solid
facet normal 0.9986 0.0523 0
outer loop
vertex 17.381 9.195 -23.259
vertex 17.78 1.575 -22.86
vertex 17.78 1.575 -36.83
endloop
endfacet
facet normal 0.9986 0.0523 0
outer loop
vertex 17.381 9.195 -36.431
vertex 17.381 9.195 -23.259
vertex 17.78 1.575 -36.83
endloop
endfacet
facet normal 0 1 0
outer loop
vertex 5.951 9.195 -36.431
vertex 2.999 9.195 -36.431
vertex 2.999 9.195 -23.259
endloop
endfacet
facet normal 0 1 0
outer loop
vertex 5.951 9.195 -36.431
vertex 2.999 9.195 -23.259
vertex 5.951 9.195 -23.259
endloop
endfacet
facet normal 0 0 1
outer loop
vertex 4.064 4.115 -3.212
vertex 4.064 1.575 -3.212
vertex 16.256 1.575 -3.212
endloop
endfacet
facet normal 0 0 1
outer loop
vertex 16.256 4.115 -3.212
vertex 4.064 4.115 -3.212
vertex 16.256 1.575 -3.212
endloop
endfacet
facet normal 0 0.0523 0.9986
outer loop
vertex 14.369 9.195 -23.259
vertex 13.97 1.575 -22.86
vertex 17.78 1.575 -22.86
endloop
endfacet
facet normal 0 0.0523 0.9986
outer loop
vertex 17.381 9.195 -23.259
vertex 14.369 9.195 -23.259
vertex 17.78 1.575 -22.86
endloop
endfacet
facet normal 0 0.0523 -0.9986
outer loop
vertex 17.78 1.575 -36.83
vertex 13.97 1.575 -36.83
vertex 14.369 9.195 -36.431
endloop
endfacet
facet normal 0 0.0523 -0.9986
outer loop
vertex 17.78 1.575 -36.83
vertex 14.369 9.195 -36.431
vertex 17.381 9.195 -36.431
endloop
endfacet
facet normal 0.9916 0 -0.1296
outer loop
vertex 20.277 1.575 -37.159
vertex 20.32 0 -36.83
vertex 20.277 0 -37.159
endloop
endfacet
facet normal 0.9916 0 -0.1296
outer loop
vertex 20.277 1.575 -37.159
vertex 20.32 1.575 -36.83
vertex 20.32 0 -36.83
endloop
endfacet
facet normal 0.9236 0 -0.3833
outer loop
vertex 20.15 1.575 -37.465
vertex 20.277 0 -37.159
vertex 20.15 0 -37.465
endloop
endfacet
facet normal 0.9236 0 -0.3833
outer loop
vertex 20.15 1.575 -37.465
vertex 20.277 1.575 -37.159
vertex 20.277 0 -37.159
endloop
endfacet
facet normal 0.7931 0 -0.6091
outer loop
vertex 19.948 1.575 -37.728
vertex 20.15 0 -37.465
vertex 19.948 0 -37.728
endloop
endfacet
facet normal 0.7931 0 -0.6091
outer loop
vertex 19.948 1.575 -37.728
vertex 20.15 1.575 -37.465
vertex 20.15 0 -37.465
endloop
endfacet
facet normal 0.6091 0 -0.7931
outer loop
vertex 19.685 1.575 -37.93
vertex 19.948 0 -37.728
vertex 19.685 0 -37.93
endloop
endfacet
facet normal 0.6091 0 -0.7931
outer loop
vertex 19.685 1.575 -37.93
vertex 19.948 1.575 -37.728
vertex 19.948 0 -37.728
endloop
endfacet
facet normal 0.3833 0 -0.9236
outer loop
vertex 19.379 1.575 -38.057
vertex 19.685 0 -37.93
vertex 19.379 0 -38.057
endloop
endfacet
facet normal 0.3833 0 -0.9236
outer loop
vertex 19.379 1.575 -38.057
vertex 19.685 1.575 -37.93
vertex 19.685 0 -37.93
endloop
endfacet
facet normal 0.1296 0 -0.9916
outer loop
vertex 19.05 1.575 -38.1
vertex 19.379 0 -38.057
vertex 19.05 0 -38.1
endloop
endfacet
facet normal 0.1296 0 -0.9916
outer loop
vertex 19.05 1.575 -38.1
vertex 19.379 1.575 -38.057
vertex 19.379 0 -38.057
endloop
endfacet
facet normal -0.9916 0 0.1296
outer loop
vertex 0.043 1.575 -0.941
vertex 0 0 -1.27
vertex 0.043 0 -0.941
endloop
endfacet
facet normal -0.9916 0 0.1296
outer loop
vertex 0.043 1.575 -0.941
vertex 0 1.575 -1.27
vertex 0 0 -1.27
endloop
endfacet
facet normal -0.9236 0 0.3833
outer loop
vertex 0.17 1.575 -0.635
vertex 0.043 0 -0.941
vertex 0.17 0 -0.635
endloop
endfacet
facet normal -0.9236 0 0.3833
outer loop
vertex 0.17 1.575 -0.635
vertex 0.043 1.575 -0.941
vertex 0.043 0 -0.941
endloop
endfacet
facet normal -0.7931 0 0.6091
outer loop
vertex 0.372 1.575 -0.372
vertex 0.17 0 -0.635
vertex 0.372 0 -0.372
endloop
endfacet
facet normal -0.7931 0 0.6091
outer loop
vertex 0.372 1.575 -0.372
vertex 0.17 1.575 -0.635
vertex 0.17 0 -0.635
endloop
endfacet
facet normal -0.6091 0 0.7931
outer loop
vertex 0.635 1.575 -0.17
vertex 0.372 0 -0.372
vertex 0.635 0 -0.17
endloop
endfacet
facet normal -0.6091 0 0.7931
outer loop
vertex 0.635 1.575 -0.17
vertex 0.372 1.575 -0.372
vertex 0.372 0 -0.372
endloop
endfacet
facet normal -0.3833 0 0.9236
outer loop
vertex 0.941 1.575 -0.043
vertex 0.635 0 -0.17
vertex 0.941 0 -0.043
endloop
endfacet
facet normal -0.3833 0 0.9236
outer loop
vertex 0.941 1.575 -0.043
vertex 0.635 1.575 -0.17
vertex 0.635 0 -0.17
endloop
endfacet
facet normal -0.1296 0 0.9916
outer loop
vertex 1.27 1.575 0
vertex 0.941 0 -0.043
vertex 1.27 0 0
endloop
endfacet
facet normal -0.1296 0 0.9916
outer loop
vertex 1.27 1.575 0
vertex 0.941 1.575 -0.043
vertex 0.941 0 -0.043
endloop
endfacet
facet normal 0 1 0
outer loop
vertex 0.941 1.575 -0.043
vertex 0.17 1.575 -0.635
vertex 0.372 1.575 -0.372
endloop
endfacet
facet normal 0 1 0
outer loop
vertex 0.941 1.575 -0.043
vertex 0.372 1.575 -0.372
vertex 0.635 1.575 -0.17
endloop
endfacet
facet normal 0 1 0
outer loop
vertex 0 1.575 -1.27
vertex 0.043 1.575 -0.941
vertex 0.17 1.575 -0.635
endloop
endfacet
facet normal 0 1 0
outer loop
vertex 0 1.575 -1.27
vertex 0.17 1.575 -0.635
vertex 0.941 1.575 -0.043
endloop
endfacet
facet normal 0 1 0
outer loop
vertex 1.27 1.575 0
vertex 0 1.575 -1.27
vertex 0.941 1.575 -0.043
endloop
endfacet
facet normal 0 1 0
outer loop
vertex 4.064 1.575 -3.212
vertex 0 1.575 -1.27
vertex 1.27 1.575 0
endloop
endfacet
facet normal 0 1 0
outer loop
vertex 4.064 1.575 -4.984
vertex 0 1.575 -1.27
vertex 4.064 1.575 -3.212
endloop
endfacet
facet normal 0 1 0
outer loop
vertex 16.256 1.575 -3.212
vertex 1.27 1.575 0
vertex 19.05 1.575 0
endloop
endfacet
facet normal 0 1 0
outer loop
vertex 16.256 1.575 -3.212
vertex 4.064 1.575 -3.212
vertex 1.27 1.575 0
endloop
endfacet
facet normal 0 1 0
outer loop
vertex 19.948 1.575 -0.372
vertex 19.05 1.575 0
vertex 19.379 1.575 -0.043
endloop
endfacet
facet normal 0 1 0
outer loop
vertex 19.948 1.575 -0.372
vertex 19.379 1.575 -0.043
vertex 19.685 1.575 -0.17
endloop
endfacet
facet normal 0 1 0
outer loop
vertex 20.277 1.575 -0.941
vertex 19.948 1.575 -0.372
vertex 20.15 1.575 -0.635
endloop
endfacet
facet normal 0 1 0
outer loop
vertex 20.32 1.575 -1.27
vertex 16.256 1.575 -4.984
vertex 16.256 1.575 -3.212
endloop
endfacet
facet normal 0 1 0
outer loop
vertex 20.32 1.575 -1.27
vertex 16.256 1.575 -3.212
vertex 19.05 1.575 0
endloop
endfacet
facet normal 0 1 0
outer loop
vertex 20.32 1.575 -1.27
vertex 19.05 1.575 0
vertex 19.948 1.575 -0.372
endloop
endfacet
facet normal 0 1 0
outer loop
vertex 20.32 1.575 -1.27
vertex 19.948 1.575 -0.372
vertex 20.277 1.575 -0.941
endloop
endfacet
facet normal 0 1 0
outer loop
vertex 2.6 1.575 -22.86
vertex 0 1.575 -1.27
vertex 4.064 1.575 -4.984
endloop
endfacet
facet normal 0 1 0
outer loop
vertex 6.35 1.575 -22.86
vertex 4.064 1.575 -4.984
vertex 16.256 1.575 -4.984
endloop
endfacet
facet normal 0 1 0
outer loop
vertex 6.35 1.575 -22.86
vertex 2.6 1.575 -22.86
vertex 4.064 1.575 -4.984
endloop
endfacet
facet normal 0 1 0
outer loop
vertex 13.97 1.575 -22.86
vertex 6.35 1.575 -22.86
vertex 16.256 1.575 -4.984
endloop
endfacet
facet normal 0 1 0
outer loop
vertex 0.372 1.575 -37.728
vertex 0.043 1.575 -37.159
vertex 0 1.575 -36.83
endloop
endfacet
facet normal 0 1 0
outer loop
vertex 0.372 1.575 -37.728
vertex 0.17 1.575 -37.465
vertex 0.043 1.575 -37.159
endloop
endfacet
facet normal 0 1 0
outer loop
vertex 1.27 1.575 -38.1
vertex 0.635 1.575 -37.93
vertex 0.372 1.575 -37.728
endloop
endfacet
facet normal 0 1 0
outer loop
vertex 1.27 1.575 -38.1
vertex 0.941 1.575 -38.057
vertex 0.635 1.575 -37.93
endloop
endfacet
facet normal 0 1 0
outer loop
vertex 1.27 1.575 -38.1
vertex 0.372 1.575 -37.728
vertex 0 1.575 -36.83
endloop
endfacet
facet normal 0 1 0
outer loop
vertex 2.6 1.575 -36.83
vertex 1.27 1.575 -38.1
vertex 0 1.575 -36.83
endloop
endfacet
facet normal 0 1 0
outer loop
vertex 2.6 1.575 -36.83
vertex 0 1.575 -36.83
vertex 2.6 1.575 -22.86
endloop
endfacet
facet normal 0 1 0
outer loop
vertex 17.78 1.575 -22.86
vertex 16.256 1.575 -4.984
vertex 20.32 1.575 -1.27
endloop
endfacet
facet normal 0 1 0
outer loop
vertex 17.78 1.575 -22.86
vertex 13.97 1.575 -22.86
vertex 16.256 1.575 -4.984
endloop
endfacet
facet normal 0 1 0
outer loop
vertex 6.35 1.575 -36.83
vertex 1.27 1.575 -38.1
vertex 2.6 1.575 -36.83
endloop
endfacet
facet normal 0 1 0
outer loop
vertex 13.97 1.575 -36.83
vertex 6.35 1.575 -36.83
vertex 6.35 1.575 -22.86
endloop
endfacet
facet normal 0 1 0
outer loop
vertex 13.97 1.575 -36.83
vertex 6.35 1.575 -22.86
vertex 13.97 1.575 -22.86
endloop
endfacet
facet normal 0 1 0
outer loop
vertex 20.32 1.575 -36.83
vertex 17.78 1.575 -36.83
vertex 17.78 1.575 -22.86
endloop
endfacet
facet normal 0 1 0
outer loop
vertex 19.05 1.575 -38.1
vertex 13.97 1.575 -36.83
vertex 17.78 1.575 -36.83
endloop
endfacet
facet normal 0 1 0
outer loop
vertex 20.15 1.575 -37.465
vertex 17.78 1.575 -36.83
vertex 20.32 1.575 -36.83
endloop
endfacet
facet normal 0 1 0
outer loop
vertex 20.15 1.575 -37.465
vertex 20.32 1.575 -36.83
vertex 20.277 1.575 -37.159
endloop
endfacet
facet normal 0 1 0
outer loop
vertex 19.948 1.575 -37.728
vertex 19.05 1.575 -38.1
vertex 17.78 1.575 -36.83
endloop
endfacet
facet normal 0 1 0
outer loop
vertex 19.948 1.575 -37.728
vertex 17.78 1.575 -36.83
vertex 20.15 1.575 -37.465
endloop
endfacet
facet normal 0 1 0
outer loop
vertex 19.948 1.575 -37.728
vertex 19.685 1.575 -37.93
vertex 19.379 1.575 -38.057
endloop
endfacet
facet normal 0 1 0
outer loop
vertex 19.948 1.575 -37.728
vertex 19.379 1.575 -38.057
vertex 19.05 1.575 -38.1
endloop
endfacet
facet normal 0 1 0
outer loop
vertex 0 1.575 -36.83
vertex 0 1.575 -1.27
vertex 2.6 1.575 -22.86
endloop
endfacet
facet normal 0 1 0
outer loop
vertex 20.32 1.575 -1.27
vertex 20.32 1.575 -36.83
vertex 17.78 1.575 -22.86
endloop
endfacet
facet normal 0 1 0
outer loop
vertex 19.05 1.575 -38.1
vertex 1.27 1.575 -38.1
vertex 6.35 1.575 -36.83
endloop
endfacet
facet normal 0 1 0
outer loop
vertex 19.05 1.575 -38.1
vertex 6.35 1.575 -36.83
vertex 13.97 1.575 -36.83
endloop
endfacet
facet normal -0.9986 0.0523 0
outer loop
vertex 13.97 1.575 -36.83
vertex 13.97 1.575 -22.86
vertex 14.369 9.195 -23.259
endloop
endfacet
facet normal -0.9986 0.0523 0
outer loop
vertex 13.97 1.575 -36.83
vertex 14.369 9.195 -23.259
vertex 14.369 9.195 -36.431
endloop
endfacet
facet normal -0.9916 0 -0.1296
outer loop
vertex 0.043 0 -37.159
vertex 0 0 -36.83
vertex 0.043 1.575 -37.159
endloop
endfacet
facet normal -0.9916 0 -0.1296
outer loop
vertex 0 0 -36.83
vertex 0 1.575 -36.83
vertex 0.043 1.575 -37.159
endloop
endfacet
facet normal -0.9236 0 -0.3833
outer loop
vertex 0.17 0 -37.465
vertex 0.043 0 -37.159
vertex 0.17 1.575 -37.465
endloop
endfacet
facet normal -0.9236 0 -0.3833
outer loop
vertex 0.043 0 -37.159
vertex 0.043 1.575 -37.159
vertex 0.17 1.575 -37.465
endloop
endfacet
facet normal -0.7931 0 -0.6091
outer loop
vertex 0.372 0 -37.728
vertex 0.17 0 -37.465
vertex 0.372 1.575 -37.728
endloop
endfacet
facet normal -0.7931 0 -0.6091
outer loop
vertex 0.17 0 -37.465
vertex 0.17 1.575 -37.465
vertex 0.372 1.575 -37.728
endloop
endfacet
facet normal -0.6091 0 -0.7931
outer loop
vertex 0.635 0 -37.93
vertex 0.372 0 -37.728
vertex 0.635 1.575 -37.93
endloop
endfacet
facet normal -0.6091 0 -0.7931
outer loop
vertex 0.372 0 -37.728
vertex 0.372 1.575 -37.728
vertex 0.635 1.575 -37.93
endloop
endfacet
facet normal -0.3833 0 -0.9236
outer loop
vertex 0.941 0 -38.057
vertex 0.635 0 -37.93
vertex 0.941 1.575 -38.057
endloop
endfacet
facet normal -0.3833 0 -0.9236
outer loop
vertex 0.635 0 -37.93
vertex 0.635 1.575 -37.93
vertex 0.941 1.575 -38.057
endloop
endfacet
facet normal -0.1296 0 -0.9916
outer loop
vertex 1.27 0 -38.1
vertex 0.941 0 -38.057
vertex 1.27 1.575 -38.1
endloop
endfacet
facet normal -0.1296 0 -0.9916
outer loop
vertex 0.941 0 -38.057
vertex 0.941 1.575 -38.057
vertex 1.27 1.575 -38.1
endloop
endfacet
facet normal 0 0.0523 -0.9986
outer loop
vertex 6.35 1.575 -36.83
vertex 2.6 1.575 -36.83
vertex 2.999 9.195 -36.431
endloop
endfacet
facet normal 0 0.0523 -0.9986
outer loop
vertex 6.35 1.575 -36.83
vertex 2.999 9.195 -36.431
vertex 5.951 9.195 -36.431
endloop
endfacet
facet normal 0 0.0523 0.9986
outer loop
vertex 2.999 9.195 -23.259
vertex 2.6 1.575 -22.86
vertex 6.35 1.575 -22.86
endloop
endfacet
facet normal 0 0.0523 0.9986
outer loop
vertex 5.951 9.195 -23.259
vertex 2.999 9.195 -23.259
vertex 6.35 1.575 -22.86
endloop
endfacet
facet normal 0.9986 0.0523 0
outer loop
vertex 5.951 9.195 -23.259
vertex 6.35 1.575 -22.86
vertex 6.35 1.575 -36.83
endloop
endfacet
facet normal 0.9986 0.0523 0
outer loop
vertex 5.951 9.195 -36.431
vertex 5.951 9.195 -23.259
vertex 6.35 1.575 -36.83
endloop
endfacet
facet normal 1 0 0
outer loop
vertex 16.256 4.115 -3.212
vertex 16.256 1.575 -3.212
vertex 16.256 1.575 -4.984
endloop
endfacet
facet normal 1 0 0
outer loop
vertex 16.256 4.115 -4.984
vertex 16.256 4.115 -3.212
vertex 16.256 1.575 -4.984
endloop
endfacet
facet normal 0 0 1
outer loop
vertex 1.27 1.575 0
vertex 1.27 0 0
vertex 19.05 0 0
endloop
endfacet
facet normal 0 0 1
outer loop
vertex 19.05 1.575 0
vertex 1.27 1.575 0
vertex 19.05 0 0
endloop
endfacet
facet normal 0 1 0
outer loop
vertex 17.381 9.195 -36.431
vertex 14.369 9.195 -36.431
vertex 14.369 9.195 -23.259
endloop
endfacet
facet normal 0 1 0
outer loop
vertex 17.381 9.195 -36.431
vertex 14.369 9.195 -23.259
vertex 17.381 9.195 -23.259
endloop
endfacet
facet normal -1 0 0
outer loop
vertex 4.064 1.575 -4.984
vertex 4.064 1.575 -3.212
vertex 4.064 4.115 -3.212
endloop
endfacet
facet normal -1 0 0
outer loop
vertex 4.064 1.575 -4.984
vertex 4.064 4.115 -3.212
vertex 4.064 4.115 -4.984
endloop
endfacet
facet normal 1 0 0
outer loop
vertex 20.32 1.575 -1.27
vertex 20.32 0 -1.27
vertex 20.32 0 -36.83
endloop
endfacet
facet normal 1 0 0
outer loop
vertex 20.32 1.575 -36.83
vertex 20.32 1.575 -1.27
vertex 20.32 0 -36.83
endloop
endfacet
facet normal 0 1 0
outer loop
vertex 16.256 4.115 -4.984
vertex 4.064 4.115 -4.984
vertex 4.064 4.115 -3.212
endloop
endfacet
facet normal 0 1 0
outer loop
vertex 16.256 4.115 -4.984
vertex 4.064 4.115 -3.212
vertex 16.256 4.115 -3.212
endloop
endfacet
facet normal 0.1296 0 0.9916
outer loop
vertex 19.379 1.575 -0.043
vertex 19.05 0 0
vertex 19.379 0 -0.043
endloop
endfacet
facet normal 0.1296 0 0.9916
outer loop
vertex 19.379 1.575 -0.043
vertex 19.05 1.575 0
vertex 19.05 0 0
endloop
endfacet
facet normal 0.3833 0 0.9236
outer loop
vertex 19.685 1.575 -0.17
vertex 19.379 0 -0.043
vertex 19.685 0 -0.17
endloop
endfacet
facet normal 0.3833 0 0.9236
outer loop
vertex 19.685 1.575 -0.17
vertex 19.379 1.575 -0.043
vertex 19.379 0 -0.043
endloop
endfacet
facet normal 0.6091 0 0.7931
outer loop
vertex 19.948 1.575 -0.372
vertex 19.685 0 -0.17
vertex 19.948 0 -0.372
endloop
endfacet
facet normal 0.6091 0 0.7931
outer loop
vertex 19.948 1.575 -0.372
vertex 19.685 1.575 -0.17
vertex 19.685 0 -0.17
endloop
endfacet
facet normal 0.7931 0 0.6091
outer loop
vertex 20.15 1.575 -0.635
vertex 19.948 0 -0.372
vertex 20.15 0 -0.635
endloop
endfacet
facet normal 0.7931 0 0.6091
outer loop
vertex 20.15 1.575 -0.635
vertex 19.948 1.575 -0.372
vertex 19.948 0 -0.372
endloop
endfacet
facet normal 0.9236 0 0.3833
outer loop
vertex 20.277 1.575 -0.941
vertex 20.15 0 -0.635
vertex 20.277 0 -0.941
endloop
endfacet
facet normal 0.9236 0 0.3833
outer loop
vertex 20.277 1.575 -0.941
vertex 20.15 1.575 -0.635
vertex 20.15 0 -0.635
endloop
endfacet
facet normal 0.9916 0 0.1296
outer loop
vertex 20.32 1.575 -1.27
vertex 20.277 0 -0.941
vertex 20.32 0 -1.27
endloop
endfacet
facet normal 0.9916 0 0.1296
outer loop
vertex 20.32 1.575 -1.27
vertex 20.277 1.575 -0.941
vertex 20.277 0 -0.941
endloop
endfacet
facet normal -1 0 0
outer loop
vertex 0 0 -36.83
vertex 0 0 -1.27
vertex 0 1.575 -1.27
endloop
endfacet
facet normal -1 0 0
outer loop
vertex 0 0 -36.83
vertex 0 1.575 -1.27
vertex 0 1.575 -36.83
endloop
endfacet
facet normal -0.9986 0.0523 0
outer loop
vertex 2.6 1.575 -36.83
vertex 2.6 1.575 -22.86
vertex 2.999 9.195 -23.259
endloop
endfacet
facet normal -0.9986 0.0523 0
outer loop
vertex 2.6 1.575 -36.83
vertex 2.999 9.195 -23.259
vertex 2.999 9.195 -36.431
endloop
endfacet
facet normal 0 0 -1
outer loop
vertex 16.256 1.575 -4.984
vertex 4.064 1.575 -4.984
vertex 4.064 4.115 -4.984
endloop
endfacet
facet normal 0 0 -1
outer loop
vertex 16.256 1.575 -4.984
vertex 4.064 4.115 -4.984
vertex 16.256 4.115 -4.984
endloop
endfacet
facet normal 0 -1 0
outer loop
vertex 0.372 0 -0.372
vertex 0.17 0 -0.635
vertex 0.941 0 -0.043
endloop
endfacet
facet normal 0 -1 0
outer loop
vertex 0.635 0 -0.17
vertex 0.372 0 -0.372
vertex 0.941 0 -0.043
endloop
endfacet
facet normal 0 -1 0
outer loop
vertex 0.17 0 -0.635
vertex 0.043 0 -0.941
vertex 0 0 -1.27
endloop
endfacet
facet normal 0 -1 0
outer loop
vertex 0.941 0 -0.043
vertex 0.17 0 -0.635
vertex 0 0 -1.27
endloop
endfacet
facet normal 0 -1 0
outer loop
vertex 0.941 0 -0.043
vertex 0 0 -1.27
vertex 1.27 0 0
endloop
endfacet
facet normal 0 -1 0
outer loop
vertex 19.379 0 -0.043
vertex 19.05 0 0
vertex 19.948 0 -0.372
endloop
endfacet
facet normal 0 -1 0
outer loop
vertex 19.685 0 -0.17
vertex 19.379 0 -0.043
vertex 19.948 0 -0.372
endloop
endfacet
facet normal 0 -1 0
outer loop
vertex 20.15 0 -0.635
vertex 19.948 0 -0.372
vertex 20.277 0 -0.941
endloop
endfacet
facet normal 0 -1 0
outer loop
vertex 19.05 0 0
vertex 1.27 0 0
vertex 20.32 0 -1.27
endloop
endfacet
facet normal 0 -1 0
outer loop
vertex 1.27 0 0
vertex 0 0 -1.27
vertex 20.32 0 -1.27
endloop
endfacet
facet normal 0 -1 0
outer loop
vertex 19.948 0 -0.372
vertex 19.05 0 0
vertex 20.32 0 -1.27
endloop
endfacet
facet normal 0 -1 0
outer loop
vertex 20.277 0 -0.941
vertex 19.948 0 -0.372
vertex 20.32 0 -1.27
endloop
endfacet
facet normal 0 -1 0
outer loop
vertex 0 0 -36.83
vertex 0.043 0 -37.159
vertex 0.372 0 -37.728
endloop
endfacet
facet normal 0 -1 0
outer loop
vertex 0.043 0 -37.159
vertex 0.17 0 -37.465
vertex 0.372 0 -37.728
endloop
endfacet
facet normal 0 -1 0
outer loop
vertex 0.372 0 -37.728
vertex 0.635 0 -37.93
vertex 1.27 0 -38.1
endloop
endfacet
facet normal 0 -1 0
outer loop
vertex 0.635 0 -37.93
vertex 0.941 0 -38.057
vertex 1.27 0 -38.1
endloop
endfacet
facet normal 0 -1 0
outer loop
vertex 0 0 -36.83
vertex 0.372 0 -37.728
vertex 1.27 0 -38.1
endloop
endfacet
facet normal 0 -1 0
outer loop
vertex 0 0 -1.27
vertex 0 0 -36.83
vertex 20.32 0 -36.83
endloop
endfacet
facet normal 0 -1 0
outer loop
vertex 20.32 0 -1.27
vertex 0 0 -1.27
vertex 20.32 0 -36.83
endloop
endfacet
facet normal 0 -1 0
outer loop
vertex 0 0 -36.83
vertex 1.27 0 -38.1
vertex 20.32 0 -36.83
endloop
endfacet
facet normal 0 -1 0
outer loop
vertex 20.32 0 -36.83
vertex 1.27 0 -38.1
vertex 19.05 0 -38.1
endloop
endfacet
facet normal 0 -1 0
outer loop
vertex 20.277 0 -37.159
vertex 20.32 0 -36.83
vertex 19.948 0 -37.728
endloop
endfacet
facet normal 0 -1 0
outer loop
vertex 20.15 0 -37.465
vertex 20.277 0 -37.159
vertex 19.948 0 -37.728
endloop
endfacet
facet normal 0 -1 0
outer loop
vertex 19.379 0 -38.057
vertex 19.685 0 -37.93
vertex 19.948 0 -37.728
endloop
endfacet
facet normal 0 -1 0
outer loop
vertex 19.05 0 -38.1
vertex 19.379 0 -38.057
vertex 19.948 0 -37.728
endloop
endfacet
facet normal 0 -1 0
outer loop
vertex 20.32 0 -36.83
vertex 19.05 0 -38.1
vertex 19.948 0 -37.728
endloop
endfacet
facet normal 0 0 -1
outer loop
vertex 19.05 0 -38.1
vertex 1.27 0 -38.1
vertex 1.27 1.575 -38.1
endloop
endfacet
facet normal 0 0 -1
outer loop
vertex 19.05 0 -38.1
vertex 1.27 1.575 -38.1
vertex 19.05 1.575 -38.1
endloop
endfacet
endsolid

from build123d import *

# Parameters (mm, degrees)
SKETCH1_W           = 20.32
SKETCH1_H           = 38.1
BOSS_EXTRUDE1_DEPTH = 1.5748
FILLET2_R           = 1.27
SKETCH2_W           = 12.192
SKETCH2_H           = 1.772385225
BOSS_EXTRUDE2_DEPTH = 2.54
SKETCH5_W           = 3.750461367
SKETCH5_H           = 13.97
SKETCH5_W_2         = 3.81
BOSS_EXTRUDE3_DEPTH = 7.62
DRAFT2_ANGLE        = 3
DRAFT3_ANGLE        = 3


with BuildPart() as part:
    # Sketch1 → Boss-Extrude1 (new body)
    with BuildSketch(Plane(origin=(0, 0, 0), x_dir=(1, 0, 0), z_dir=(0, 1, 0))):
        with Locations((10.16, 19.05)):
            Rectangle(SKETCH1_W, SKETCH1_H)
    extrude(amount=BOSS_EXTRUDE1_DEPTH)

    # Fillet2
    fillet2_edges = [part.edges().sort_by_distance(p)[0] for p in [
        (0, 0.7874, -38.1),
        (20.32, 0.7874, -38.1),
        (20.32, 0.7874, 0),
        (0, 0.7874, 0),
    ]]
    fillet(fillet2_edges, radius=FILLET2_R)

    # Sketch2 → Boss-Extrude2 (add)
    with BuildSketch(Plane(origin=(0, 1.5748, 0), x_dir=(1, 0, 0), z_dir=(0, 1, 0))):
        with Locations((10.16, 4.097897191)):
            Rectangle(SKETCH2_W, SKETCH2_H)
    extrude(amount=BOSS_EXTRUDE2_DEPTH)

    # Sketch5 → Boss-Extrude3 (add)
    with BuildSketch(Plane(origin=(0, 1.5748, 0), x_dir=(1, 0, 0), z_dir=(0, 1, 0))):
        with Locations((4.474769317, 29.845)):
            Rectangle(SKETCH5_W, SKETCH5_H)
        with Locations((15.875, 29.845)):
            Rectangle(SKETCH5_W_2, SKETCH5_H)
    extrude(amount=BOSS_EXTRUDE3_DEPTH)

    # Draft2
    draft2_faces = [part.faces().sort_by_distance(p)[0] for p in [
        (2.599538633, 5.3848, -29.845),
        (4.474769317, 5.3848, -36.83),
        (6.35, 5.3848, -29.845),
        (4.474769317, 5.3848, -22.86),
    ]]
    draft(draft2_faces, Plane.ZX.offset(1.5748), DRAFT2_ANGLE)

    # Draft3
    draft3_faces = [part.faces().sort_by_distance(p)[0] for p in [
        (15.875, 5.3848, -22.86),
        (13.97, 5.3848, -29.845),
        (15.875, 5.3848, -36.83),
        (17.78, 5.3848, -29.845),
    ]]
    draft(draft3_faces, Plane.ZX.offset(1.5748), DRAFT3_ANGLE)


solid = part.part
